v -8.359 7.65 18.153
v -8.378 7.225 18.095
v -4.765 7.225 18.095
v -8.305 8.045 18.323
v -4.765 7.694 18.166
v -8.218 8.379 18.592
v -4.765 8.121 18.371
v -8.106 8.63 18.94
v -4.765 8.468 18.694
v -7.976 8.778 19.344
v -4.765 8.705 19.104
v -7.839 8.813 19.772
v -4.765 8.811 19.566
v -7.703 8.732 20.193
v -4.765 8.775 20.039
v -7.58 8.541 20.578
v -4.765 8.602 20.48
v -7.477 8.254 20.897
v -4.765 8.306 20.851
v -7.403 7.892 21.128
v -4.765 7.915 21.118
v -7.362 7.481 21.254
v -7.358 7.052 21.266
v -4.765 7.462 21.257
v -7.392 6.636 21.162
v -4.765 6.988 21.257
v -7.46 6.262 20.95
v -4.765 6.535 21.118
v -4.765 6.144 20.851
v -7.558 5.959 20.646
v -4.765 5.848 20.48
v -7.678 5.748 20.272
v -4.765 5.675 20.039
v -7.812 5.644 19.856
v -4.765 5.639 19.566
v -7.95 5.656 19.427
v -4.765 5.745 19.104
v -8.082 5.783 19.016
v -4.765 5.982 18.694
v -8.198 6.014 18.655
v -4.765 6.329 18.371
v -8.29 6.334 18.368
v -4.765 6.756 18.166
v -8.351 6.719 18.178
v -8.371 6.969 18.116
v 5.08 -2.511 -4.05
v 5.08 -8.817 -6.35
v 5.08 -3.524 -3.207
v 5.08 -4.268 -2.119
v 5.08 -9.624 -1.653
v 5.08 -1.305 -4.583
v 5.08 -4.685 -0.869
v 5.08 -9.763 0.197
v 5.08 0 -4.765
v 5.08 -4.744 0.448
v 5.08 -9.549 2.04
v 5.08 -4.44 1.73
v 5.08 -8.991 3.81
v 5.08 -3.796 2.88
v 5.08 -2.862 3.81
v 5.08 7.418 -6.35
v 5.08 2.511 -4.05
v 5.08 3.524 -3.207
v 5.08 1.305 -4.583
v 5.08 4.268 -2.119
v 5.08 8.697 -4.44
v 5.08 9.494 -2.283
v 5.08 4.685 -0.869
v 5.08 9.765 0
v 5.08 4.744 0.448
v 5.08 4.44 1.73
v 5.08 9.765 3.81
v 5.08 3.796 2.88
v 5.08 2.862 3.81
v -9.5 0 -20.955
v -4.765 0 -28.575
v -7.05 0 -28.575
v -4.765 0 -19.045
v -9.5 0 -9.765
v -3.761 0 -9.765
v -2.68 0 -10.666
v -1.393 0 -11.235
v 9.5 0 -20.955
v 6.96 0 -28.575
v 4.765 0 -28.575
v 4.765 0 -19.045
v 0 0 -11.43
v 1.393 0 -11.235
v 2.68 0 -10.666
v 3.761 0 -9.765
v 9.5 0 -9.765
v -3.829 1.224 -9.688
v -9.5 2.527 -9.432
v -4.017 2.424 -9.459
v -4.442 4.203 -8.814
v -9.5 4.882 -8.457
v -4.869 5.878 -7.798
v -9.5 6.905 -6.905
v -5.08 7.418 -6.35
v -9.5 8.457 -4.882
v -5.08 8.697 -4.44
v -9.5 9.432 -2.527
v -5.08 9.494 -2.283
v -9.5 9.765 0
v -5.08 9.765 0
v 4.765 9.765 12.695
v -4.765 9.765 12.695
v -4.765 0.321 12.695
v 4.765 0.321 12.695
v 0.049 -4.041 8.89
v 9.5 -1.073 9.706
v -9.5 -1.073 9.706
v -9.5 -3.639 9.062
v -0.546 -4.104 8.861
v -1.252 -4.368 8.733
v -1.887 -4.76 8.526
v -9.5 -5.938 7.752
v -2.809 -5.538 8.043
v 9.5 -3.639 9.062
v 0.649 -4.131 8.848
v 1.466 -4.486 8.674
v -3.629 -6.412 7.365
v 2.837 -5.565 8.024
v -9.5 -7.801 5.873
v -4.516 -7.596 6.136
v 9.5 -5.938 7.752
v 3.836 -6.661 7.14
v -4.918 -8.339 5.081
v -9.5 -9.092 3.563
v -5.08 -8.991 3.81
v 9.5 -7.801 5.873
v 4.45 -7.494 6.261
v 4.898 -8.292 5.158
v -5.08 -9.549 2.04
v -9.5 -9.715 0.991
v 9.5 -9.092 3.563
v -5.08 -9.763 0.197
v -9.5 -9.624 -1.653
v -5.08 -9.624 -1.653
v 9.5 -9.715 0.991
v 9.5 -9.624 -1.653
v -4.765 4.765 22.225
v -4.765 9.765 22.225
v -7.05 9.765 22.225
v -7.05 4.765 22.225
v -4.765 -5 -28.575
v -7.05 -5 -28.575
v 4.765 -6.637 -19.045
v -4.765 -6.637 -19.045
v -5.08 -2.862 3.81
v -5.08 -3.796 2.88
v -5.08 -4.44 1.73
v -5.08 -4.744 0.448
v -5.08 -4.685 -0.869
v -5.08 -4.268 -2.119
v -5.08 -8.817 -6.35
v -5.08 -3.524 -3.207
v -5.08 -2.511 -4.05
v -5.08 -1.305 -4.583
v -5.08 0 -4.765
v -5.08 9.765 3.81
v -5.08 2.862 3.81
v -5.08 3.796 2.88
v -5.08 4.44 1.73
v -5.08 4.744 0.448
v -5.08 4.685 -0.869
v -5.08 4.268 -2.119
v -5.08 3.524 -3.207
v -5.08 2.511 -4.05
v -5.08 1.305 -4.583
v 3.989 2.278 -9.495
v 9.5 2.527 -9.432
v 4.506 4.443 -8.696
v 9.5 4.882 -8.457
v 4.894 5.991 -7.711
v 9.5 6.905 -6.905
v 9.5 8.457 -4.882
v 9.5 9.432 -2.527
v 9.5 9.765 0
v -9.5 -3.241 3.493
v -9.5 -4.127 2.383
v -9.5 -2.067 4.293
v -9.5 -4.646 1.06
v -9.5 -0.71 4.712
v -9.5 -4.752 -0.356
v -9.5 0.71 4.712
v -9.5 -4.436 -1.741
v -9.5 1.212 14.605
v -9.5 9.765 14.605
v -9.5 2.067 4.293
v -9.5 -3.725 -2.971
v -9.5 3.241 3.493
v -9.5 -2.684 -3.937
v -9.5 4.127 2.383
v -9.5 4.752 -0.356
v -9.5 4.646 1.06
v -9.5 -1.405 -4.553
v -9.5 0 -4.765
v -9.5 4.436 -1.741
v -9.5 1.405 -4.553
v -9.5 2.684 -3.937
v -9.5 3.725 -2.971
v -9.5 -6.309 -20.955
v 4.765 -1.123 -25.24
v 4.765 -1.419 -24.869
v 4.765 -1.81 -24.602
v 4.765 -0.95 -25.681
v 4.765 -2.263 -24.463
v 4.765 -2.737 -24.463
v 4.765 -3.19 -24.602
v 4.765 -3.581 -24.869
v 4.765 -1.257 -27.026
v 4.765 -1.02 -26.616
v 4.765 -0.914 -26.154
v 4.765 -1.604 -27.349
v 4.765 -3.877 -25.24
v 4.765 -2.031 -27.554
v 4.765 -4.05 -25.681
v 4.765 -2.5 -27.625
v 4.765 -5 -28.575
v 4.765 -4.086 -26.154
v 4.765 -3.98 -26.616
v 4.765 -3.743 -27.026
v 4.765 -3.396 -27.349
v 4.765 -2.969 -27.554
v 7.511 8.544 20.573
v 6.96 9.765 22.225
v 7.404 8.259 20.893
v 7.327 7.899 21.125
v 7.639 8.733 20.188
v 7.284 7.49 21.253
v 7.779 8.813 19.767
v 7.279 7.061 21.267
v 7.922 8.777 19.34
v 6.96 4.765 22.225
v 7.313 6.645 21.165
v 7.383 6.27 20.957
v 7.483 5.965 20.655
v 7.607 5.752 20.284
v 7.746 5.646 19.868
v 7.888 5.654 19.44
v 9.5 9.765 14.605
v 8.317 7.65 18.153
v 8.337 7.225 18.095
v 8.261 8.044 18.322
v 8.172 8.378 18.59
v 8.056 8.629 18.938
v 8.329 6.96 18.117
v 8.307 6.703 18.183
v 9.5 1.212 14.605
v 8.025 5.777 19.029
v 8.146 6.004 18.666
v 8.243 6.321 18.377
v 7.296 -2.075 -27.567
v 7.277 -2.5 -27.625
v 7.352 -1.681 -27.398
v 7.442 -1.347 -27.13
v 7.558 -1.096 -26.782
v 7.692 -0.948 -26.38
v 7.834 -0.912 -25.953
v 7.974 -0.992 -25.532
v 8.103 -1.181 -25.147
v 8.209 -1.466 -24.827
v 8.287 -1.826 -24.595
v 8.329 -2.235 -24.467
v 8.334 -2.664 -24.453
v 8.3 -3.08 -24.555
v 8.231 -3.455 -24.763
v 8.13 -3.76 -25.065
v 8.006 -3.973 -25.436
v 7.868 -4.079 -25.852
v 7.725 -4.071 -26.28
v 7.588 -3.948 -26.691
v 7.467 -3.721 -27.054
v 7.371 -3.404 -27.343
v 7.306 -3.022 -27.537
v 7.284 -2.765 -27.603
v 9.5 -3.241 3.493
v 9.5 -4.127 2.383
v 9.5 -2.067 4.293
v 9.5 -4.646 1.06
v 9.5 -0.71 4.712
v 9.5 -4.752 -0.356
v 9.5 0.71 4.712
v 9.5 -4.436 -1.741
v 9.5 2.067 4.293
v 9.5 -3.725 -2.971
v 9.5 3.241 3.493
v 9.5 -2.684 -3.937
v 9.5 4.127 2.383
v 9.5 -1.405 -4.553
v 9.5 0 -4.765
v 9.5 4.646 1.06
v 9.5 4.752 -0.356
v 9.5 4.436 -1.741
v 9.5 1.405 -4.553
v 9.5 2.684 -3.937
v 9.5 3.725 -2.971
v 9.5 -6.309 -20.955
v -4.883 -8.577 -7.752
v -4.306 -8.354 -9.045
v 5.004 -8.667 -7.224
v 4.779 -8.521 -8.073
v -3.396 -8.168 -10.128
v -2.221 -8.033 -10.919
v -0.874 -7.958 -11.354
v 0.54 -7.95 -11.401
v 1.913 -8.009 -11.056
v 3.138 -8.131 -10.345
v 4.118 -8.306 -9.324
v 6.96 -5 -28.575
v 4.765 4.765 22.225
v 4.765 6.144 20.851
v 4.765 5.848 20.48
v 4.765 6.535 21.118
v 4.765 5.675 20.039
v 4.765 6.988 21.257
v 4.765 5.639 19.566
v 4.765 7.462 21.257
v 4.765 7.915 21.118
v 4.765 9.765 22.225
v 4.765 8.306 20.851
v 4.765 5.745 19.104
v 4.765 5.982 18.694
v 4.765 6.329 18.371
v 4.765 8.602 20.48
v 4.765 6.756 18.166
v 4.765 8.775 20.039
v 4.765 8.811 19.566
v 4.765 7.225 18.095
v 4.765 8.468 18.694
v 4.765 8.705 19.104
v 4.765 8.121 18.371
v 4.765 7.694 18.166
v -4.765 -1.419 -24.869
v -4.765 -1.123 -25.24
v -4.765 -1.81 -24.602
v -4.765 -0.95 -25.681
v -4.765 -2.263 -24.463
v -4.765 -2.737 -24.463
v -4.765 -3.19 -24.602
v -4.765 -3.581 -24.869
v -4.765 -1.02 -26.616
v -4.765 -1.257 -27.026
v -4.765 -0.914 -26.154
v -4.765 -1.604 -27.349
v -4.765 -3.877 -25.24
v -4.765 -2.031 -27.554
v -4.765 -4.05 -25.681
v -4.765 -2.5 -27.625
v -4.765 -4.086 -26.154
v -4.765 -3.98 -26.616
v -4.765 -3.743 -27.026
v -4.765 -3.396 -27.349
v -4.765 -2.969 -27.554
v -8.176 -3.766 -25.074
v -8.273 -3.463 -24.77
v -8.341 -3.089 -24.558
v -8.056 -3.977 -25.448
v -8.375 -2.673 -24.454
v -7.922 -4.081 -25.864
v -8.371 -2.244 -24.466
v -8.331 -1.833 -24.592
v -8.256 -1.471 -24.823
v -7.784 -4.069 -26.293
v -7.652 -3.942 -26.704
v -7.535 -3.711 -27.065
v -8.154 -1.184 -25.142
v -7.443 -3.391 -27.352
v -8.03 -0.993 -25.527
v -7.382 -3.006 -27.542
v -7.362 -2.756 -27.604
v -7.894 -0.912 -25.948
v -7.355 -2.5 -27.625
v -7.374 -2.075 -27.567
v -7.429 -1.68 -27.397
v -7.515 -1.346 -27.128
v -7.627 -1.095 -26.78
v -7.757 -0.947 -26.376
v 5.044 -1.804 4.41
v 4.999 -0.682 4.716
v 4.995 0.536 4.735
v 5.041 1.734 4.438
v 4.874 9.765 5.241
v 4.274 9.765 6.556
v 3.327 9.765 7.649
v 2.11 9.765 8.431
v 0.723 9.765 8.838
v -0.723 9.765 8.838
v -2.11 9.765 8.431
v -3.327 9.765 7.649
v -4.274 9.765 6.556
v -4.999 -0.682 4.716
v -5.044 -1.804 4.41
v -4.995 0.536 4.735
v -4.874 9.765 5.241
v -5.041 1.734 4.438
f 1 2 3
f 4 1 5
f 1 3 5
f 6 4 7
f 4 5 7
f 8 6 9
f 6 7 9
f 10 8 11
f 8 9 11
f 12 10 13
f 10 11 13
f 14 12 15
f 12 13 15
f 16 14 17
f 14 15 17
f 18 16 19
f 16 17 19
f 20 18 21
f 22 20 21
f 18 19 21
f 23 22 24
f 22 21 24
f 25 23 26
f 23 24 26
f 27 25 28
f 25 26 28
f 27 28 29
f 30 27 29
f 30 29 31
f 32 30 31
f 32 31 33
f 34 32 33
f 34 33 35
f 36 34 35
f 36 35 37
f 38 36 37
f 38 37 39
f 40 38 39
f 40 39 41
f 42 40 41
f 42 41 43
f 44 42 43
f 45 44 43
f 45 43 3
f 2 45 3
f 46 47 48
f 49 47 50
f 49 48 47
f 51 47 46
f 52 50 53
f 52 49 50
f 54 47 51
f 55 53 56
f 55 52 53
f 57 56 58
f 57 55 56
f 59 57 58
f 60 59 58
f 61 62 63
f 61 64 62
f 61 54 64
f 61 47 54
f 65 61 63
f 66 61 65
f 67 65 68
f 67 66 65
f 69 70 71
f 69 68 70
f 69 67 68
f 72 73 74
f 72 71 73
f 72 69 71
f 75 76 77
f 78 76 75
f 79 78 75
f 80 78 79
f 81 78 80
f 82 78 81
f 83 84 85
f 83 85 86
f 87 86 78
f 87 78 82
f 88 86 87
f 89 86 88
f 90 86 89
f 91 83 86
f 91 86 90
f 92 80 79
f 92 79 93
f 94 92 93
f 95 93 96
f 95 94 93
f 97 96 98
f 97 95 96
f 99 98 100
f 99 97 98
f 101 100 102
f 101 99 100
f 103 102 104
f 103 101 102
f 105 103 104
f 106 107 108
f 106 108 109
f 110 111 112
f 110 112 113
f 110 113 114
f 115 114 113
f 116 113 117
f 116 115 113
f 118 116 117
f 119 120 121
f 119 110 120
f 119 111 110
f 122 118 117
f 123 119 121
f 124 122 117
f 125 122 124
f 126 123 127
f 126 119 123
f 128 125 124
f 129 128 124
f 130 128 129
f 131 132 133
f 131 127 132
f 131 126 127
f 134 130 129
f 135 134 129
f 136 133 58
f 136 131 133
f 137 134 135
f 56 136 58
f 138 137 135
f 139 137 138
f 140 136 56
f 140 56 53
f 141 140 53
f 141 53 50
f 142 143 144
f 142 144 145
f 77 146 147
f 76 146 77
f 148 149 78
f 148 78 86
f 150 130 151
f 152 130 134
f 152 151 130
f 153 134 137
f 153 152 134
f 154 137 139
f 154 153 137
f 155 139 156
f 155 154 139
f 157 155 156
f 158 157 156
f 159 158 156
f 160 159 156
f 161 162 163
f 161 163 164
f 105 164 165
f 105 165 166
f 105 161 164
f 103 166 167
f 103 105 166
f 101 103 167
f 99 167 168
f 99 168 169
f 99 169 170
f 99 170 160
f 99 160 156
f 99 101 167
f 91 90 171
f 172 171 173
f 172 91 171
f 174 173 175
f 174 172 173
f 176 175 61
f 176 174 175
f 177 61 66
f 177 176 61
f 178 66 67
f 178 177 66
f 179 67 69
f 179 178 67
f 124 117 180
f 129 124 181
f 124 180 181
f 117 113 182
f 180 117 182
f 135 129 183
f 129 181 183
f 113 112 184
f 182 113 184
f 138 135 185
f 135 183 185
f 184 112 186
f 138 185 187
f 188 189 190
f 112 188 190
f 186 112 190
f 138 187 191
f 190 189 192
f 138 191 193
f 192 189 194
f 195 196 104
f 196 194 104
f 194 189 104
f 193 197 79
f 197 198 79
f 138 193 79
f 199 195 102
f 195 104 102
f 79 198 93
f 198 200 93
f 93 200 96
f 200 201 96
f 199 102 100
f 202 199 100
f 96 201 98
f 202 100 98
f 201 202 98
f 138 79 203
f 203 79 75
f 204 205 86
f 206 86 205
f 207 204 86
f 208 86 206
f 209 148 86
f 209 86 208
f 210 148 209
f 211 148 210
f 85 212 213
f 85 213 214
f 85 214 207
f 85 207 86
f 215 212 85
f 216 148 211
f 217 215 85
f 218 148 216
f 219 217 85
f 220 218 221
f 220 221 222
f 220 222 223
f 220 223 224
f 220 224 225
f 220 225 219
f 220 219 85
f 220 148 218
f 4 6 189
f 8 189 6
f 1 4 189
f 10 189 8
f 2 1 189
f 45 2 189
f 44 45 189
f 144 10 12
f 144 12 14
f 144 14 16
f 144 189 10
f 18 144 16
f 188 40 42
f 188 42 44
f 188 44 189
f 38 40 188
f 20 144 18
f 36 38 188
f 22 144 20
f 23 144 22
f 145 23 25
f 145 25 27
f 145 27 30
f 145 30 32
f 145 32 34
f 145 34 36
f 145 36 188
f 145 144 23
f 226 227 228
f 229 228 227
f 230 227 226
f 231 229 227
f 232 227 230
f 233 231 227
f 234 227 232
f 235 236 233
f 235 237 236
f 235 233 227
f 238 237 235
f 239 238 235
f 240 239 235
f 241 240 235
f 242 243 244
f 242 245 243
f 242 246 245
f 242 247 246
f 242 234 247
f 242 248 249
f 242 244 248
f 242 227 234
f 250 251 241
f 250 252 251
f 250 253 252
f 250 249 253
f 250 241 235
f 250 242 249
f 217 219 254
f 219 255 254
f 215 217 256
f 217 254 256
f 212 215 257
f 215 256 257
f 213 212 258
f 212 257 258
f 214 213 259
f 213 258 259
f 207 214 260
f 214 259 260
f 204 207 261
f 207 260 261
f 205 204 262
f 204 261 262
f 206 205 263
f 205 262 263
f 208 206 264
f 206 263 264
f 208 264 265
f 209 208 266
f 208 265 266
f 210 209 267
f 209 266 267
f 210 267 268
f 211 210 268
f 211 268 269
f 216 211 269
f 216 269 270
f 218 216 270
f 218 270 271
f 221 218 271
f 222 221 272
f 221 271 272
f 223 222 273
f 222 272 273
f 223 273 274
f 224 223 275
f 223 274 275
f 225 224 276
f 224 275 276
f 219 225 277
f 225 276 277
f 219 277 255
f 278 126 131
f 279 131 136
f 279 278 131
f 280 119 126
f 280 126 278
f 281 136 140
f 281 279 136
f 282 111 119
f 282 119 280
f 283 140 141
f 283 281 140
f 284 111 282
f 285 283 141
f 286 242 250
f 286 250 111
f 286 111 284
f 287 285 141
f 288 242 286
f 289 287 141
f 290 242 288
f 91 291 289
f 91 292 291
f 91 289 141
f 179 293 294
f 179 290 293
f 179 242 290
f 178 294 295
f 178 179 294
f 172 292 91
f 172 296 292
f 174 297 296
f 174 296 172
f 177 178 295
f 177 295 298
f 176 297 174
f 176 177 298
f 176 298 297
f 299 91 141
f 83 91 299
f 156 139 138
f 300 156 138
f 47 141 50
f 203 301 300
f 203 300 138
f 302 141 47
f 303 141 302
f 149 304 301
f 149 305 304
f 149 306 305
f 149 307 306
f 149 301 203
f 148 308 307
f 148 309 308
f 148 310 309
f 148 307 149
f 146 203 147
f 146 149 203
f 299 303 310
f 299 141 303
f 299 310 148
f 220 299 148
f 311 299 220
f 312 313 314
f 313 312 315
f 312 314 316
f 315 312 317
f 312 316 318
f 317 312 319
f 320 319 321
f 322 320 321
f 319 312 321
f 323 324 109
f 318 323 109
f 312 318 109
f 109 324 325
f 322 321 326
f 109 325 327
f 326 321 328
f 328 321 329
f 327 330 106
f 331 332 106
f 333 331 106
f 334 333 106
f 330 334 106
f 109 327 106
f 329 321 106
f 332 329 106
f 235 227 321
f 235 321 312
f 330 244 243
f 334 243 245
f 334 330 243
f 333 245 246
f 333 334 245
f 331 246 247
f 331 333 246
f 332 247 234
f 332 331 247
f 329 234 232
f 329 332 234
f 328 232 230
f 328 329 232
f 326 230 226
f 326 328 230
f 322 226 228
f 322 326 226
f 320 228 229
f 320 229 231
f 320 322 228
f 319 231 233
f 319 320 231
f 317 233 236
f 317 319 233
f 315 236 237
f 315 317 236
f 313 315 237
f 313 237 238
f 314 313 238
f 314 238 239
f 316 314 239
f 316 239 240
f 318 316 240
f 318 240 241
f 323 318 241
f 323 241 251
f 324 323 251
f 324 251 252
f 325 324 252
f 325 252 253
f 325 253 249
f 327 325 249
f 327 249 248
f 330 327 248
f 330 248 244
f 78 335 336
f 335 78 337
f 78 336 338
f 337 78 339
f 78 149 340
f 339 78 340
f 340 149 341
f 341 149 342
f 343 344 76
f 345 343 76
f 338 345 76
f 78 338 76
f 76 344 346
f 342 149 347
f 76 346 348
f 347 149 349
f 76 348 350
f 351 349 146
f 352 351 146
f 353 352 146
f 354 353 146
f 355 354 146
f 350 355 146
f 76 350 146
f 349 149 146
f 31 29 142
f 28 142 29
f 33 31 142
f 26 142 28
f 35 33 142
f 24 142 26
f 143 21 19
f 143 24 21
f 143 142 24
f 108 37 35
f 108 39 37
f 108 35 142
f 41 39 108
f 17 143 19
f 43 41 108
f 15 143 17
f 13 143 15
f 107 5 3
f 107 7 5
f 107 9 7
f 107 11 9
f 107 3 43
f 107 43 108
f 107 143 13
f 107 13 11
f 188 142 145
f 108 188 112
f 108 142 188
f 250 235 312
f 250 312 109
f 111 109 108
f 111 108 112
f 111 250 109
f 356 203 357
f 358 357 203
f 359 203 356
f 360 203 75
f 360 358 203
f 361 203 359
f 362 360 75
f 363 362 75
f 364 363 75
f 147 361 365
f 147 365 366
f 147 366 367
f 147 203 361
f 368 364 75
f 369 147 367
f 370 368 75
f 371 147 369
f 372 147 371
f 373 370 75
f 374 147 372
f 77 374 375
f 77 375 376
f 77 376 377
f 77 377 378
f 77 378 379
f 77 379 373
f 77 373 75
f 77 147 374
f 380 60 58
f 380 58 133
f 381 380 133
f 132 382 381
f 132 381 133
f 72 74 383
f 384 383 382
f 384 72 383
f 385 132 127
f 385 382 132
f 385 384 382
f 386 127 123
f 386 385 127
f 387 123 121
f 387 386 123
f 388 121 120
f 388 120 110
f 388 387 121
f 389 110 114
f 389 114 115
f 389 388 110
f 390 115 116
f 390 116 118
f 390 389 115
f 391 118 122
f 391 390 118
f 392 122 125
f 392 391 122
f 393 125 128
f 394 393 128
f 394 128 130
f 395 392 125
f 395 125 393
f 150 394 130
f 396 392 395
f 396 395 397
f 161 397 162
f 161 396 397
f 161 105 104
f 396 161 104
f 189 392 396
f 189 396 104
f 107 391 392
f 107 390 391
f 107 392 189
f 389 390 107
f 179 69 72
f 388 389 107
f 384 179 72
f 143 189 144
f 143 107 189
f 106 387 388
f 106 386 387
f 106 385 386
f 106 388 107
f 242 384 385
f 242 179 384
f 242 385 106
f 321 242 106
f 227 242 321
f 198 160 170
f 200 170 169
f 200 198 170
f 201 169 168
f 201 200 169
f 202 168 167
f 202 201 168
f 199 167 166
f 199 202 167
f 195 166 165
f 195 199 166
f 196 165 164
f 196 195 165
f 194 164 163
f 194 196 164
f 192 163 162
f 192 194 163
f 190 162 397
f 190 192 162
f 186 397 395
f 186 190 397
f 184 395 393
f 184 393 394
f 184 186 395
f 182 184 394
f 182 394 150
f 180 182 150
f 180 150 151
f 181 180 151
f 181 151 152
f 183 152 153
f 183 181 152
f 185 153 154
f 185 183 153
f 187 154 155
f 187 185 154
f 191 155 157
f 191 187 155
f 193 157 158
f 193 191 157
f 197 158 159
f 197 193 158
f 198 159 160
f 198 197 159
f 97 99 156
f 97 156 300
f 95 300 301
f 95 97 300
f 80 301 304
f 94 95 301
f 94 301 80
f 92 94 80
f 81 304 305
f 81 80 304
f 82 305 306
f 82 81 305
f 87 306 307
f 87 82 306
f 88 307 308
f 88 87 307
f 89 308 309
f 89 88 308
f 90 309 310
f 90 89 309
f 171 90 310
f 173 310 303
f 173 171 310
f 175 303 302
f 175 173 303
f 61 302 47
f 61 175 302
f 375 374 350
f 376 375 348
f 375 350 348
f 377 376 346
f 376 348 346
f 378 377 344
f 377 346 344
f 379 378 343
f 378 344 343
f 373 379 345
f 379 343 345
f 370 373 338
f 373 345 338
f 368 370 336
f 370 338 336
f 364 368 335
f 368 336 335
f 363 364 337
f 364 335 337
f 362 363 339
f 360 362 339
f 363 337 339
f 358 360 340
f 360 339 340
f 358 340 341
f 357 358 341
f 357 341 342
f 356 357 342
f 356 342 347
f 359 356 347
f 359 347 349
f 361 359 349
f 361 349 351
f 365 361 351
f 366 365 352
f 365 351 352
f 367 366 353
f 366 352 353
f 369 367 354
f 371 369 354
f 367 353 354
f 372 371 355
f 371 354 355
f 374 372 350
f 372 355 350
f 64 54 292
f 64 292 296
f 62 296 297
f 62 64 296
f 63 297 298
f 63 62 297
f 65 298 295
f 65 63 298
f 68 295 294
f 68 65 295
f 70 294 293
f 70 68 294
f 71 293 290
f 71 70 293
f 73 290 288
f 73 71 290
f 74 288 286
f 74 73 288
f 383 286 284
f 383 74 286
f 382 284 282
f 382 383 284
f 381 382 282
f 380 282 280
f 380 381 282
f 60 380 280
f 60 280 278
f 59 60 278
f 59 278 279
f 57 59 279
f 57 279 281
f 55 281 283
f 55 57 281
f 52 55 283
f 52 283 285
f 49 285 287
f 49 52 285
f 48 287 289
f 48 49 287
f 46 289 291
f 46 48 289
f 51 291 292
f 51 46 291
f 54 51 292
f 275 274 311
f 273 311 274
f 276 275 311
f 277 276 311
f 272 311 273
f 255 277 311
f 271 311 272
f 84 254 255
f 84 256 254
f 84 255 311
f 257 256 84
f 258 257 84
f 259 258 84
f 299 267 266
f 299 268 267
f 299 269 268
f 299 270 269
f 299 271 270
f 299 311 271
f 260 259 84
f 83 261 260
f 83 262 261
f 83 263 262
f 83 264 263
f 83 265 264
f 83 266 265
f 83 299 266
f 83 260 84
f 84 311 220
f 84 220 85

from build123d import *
from OCP.BRepFilletAPI import BRepFilletAPI_MakeChamfer

# Parameters (mm, degrees)
SKETCH1_R           = 4.765
BOSS_EXTRUDE1_DEPTH = 9.5
CHAMFER1_SIZE       = 2.54
CHAMFER1_SIZE2      = 7.62
CHAMFER2_SIZE       = 7.62
CHAMFER2_SIZE2      = 2.45
CUT_EXTRUDE1_DEPTH  = 17.5
SKETCH3_W           = 9.53
SKETCH3_H           = 9.53
CUT_EXTRUDE2_DEPTH  = 17.5
SKETCH4_R           = 1.59
CUT_EXTRUDE3_DEPTH  = 17.5


with BuildPart() as part:
    # Sketch1 → Boss-Extrude1 (new, symmetric)
    with BuildSketch(Plane(origin=(0, 0, 0), x_dir=(0, 0, -1), z_dir=(1, 0, 0))):
        with BuildLine():
            Line((0, 9.765), (-22.225, 9.765))
            Line((-22.225, 9.765), (-22.225, 4.765))
            Line((-22.225, 4.765), (-9.705896356, -1.072753903))
            ThreePointArc((-9.705896356, -1.072753903), (-5.873116096, -7.801392973), (1.653013564, -9.624072483))
            Line((1.653013564, -9.624072483), (28.575, -5))
            Line((28.575, -5), (28.575, 0))
            Line((28.575, 0), (9.765, 0))
            ThreePointArc((9.765, 0), (6.904897718, 6.904897718), (0, 9.765))
        make_face()
        Circle(SKETCH1_R, mode=Mode.SUBTRACT)
    extrude(amount=BOSS_EXTRUDE1_DEPTH, both=True)

    # Chamfer1: one chamfer whose edges measure the first distance from different faces: ONE call of the kernel's chamfer builder (chamfer() names one face for all edges)
    chamfer1_edges_1 = [part.edges().sort_by_distance(p)[0] for p in [
        (9.5, 7.265, 22.225),
    ]]
    chamfer1_side_1 = [part.faces().sort_by_distance(p)[0] for p in [
        (0, 7.265, 22.225),
    ]]
    chamfer1_edges_2 = [part.edges().sort_by_distance(p)[0] for p in [
        (9.5, -2.5, -28.575),
    ]]
    chamfer1_side_2 = [part.faces().sort_by_distance(p)[0] for p in [
        (0, -2.5, -28.575),
    ]]
    chamfer1 = BRepFilletAPI_MakeChamfer(part.part.solid().wrapped)
    for e in chamfer1_edges_1:
        chamfer1.Add(CHAMFER1_SIZE, CHAMFER1_SIZE2, e.wrapped, chamfer1_side_1[0].wrapped)  # the first distance lies on this face
    for e in chamfer1_edges_2:
        chamfer1.Add(CHAMFER1_SIZE, CHAMFER1_SIZE2, e.wrapped, chamfer1_side_2[0].wrapped)  # the first distance lies on this face
    add(Compound.cast(chamfer1.Shape()), mode=Mode.REPLACE)

    # Chamfer2
    chamfer2_edges = [part.edges().sort_by_distance(p)[0] for p in [
        (-9.5, 7.265, 22.225),
        (-9.5, -2.5, -28.575),
    ]]
    chamfer2_side = [part.faces().sort_by_distance(p)[0] for p in [
        (-9.5, 9.220751812, 11.1125),
    ]]
    chamfer(chamfer2_edges, length=CHAMFER2_SIZE, length2=CHAMFER2_SIZE2, reference=chamfer2_side[0])

    # Sketch2 → Cut-Extrude1 (cut, symmetric)
    with BuildSketch(Plane(origin=(0, 0, 0), x_dir=(1, 0, 0), z_dir=(0, 1, 0))):
        with BuildLine():
            Line((5.08, 6.35), (5.08, -3.81))
            ThreePointArc((5.08, -3.81), (0, -8.89), (-5.08, -3.81))
            Line((-5.08, -3.81), (-5.08, 6.35))
            ThreePointArc((-5.08, 6.35), (0, 11.43), (5.08, 6.35))
        make_face()
    extrude(amount=CUT_EXTRUDE1_DEPTH, both=True, mode=Mode.SUBTRACT)

    # Sketch3 → Cut-Extrude2 (cut, symmetric)
    with BuildSketch(Plane(origin=(0, 0, 0), x_dir=(1, 0, 0), z_dir=(0, 1, 0))):
        with Locations((0, 23.81)):
            Rectangle(SKETCH3_W, SKETCH3_H)
        with Locations((0, -17.46)):
            Rectangle(SKETCH3_W, SKETCH3_H)
    extrude(amount=CUT_EXTRUDE2_DEPTH, both=True, mode=Mode.SUBTRACT)

    # Sketch4 → Cut-Extrude3 (cut, symmetric)
    with BuildSketch(Plane(origin=(0, 0, 0), x_dir=(0, 0, -1), z_dir=(1, 0, 0))):
        with Locations((-19.685, 7.225)):
            Circle(SKETCH4_R)
        with Locations((26.035, -2.5)):
            Circle(SKETCH4_R)
    extrude(amount=CUT_EXTRUDE3_DEPTH, both=True, mode=Mode.SUBTRACT)


solid = part.part
